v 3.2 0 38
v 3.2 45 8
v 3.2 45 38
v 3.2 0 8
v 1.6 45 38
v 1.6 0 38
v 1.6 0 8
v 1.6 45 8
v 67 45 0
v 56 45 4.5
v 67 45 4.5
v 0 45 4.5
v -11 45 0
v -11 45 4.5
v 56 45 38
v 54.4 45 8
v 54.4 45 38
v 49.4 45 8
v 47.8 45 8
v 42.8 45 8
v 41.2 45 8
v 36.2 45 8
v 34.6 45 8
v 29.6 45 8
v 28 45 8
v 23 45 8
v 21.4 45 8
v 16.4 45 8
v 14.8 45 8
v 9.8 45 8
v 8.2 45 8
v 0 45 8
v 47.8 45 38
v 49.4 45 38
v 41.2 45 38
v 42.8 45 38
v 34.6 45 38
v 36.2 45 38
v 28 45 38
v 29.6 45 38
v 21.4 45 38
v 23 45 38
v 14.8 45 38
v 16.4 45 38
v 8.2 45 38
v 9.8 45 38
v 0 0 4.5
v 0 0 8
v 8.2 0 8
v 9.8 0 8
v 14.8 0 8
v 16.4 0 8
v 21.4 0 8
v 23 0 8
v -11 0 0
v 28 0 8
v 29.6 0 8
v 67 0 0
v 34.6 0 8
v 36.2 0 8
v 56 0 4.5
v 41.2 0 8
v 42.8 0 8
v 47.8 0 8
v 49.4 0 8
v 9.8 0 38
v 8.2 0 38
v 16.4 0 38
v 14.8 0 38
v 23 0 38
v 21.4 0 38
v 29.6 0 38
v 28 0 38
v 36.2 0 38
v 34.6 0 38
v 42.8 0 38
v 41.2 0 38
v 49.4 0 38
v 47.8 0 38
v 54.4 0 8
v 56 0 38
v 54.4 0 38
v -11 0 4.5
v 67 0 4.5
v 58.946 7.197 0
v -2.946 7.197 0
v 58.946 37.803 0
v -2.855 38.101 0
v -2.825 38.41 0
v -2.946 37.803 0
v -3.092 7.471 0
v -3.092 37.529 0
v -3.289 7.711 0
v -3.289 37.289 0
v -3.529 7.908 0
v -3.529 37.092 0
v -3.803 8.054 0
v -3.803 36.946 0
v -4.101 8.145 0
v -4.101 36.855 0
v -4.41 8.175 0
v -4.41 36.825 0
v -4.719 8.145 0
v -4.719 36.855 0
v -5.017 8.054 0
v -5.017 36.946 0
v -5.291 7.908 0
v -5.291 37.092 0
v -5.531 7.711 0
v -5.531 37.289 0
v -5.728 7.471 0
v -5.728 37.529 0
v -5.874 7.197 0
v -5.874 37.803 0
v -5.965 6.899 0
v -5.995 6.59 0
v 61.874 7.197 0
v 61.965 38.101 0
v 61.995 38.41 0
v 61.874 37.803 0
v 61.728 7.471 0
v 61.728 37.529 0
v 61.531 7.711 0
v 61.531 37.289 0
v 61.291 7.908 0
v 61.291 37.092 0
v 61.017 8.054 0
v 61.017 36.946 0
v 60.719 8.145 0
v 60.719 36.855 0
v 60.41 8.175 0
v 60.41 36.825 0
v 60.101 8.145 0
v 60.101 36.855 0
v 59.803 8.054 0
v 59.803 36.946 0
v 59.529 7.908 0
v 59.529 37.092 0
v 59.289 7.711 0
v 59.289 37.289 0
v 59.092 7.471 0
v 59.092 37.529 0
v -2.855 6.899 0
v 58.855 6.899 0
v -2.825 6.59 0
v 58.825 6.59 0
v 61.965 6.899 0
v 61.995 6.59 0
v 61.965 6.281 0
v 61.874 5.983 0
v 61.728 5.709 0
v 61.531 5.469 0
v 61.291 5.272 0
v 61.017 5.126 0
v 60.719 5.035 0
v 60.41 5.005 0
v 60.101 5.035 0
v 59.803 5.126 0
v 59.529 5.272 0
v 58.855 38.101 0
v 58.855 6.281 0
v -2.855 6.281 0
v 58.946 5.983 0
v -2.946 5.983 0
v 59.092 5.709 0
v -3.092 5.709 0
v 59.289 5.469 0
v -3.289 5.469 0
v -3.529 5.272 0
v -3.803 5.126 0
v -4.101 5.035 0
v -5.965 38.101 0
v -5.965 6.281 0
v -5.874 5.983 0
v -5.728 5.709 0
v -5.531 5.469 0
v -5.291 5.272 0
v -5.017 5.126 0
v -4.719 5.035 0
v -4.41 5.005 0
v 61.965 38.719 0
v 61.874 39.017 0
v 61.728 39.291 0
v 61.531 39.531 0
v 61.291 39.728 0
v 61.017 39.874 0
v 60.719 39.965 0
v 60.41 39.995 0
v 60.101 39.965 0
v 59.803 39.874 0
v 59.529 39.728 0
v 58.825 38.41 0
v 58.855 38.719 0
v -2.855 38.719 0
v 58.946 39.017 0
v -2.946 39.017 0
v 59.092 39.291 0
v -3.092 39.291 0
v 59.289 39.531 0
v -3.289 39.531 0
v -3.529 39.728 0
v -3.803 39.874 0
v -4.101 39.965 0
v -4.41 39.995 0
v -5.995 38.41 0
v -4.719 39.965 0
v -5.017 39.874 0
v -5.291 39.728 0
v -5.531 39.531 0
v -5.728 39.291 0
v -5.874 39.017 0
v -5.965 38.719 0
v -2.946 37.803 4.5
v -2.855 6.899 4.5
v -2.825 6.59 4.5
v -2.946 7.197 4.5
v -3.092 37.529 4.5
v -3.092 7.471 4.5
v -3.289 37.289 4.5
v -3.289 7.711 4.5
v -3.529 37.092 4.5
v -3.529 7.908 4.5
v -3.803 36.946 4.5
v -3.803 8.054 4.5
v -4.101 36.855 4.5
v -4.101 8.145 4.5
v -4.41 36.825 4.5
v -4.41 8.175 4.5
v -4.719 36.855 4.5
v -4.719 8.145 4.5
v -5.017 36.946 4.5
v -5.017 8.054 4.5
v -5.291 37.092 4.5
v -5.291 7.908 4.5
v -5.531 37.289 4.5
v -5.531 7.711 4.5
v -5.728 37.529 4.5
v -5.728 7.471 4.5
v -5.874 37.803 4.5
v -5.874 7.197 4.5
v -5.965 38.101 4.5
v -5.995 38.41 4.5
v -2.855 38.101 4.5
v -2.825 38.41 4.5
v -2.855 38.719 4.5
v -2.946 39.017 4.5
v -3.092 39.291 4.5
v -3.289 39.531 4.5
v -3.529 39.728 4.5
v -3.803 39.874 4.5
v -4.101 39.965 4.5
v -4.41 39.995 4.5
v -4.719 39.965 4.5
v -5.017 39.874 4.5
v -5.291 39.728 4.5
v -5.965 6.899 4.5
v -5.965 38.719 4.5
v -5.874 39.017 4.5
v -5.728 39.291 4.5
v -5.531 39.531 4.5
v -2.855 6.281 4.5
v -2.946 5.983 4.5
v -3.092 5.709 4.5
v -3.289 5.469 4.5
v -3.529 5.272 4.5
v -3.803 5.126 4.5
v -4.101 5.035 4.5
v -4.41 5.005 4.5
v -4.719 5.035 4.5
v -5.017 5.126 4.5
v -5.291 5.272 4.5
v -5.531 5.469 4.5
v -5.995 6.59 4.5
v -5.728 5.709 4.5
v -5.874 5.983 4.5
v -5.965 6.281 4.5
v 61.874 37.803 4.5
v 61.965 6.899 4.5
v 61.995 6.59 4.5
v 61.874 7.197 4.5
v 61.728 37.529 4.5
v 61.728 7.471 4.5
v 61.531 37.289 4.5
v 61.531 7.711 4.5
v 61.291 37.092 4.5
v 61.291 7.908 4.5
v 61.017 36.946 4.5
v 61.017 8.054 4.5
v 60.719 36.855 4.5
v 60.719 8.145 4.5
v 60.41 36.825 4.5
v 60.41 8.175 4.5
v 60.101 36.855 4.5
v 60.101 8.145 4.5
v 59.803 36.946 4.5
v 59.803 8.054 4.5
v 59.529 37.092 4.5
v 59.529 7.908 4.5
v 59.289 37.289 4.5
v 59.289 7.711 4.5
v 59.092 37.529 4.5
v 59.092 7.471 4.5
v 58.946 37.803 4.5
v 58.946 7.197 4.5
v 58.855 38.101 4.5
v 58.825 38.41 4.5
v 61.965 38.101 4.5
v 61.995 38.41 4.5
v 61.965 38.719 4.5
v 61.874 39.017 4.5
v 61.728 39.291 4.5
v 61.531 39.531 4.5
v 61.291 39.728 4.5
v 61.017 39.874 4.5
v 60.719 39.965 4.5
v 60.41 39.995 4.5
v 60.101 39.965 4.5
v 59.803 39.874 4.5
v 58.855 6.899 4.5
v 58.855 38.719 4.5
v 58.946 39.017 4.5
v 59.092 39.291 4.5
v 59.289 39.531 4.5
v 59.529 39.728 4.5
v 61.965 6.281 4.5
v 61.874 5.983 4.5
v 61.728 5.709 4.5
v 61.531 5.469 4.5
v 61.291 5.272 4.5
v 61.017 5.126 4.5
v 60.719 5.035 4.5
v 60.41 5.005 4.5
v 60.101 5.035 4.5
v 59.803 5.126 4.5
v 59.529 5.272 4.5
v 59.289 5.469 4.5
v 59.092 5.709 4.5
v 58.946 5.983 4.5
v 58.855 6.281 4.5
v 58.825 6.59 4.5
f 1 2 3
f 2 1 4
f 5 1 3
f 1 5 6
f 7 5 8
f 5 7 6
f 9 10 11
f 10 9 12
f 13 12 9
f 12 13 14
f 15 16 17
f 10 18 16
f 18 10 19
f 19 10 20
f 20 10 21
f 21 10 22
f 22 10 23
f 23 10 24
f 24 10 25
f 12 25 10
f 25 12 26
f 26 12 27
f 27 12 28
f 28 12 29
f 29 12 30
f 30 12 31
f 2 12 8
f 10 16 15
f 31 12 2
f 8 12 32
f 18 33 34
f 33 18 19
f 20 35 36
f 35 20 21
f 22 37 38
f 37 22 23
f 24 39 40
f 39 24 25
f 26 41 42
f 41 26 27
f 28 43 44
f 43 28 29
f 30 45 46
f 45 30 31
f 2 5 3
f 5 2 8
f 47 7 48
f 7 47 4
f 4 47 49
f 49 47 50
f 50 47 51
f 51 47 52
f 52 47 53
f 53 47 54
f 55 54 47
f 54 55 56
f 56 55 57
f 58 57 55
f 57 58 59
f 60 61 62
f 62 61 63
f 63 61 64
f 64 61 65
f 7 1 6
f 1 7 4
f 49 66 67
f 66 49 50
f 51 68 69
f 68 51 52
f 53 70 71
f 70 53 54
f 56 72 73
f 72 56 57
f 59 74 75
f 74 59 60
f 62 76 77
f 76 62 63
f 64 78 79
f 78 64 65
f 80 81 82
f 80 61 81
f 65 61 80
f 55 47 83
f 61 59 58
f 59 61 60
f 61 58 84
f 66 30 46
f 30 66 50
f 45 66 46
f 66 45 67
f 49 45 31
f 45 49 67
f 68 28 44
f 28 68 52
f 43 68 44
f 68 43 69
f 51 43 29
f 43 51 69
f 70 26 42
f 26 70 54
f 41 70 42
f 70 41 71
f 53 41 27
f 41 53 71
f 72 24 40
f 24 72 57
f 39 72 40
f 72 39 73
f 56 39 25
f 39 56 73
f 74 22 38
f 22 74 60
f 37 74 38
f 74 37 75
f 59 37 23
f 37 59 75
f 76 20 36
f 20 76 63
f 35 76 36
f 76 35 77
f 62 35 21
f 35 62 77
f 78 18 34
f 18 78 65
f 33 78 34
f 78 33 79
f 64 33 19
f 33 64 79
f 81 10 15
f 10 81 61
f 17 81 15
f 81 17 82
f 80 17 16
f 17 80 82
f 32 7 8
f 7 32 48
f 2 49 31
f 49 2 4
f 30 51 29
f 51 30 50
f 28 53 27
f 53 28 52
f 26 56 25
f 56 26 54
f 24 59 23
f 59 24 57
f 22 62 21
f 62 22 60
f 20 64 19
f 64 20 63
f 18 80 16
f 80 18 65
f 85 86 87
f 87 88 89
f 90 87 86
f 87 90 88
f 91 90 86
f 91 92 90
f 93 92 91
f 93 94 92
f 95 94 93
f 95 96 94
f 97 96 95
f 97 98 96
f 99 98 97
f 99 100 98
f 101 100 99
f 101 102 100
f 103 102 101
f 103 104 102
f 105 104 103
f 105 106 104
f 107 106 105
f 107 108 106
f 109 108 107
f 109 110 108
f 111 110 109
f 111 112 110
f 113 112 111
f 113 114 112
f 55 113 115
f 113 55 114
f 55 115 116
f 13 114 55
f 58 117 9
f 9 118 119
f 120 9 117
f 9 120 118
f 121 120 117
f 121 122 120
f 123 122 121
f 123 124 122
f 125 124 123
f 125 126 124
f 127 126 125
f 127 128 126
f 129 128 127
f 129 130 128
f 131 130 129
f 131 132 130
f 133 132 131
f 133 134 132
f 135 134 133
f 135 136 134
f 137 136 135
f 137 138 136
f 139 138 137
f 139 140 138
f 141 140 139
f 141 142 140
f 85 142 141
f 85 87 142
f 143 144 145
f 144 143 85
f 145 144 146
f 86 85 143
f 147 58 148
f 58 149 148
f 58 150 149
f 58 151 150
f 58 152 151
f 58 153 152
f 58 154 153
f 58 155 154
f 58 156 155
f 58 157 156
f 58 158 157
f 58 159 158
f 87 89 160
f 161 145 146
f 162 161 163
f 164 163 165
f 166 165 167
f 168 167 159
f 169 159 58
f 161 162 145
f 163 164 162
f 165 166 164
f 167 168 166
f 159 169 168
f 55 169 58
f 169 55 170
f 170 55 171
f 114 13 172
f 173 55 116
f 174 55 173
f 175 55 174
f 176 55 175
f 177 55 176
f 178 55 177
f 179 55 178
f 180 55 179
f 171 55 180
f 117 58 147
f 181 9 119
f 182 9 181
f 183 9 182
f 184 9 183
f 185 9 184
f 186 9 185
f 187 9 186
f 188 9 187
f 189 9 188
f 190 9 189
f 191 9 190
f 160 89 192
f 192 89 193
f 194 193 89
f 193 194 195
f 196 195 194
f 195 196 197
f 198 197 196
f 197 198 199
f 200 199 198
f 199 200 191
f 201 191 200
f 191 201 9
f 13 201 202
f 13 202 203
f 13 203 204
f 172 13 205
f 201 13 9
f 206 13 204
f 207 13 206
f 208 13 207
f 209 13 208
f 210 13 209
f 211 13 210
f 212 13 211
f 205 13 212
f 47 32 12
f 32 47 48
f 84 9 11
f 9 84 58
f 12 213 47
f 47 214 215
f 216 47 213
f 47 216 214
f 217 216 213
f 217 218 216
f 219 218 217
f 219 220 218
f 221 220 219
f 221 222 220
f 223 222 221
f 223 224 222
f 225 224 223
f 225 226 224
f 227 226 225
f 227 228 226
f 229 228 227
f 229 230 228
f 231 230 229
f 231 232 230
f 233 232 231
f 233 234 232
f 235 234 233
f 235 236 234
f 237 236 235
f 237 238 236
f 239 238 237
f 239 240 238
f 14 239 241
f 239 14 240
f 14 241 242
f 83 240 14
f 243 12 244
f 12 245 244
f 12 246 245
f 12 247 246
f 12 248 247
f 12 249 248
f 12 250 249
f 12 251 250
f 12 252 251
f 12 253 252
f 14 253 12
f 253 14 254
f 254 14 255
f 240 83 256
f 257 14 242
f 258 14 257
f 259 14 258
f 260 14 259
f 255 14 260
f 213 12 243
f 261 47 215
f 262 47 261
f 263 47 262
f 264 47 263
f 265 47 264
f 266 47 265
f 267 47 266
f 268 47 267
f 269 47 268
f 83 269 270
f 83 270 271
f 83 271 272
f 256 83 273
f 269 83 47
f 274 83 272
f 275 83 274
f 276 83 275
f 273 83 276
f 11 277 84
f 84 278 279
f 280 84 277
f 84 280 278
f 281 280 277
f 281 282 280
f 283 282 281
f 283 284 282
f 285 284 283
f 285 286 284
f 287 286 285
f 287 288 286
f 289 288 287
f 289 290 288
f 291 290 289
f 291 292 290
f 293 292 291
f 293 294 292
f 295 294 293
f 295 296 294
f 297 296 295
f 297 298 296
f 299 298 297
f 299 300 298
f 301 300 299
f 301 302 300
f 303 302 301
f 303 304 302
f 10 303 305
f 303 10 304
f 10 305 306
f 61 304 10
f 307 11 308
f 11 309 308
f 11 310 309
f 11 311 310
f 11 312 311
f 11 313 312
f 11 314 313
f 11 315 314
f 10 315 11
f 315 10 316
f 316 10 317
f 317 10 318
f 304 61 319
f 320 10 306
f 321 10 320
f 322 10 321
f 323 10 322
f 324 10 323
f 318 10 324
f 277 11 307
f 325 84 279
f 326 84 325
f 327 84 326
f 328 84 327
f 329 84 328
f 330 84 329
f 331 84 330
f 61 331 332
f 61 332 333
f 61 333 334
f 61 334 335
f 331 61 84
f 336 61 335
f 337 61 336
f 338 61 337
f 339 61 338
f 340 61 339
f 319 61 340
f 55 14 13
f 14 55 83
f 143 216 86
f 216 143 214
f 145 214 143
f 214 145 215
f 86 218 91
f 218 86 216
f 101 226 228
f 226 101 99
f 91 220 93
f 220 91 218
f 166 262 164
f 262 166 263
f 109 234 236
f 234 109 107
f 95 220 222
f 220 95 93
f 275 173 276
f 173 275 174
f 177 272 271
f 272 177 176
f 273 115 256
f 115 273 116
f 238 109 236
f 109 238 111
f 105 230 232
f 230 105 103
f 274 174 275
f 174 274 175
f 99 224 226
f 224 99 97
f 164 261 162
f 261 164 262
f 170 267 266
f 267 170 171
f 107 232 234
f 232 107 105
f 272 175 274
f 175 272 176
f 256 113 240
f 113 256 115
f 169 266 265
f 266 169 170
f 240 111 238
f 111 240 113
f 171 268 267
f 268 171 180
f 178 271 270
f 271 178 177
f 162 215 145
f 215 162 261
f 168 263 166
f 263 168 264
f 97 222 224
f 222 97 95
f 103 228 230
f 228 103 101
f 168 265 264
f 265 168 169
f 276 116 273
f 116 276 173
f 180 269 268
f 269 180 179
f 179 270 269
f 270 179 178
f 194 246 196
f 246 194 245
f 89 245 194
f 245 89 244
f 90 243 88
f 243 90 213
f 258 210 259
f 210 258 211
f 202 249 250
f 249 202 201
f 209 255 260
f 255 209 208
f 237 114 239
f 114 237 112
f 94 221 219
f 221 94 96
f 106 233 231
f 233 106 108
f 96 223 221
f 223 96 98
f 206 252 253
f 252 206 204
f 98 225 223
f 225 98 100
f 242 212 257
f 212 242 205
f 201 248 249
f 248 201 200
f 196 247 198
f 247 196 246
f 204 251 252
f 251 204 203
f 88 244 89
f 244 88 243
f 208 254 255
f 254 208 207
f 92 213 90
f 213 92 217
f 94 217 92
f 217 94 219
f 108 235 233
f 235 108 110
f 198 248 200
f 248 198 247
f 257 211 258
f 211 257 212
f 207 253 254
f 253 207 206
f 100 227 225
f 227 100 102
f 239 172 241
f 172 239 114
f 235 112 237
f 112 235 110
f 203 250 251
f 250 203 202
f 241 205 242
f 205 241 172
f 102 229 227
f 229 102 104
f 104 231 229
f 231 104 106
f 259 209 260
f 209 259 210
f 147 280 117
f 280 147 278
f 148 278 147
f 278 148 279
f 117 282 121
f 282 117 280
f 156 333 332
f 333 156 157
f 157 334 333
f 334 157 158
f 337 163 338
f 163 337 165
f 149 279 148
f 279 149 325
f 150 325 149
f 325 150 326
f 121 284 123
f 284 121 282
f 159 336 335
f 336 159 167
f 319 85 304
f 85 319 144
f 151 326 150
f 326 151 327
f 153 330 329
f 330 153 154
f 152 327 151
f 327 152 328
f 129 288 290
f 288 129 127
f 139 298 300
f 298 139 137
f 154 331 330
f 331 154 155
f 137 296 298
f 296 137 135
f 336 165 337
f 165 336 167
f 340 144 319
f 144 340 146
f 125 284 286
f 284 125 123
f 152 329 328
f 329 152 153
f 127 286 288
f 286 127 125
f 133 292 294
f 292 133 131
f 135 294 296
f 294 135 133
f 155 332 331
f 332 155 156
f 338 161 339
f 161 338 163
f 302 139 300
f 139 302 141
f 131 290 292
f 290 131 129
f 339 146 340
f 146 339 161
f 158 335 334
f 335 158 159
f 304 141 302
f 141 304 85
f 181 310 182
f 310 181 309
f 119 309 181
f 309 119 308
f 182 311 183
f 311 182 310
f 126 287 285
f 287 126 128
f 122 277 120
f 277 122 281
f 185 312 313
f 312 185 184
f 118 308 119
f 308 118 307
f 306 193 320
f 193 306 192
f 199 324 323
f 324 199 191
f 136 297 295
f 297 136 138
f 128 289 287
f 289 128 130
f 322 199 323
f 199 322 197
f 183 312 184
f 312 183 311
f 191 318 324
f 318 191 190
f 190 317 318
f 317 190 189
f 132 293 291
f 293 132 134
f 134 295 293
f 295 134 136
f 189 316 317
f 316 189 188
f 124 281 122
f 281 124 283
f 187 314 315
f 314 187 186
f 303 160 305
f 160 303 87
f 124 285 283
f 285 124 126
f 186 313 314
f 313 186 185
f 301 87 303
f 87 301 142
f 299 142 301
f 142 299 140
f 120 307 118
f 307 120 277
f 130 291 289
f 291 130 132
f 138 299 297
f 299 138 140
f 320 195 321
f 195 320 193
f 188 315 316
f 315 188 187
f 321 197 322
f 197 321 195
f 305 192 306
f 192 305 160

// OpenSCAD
$fn = 32;

// ----------------------------------------------------------------------
// Finned heat sink: 56 x 45 mm base, 30 mm fins
// ----------------------------------------------------------------------

// --- parameters (mm) ---
base_w = 56;              // base width
base_d = 45;              // base depth
base_t = 8;               // base thickness
fin_h = 30;               // fin height above the base
holes_d = 3.17;           // fixing holes
hole_x = 32.41;           // hole offset in x
hole_y = 15.91;           // hole offset in y
fin_t = 1.6;              // fin thickness
fin_pitch = 6.6;          // fin pitch
fin_count = 9;            // number of fins
fin_x0 = 1.6;             // first fin offset
flange_w = 78;            // flange plate width
flange_t = 4;             // flange plate thickness

difference() {
  union() {
    cube([base_w, base_d, base_t]);
    for (i = [0 : fin_count - 1]) {
      translate([fin_x0 + i * fin_pitch, 0, base_t - 0.5]) cube([fin_t, base_d, fin_h + 0.5]);
    }
    /* mounting flange, a wider plate sharing the base bottom */
    translate([(base_w - flange_w) / 2, 0, 0]) cube([flange_w, base_d, flange_t + 0.5]);
  }
  /* fixing holes through the base, 2.5 mm clear on both sides */
  for (hx = [-32.41, 32.41]) {
    for (hy = [-15.91, 15.91]) {
      translate([base_w / 2 + hx, base_d / 2 + hy, -2.5]) cylinder(h = base_t + 5, d = holes_d);
    }
  }
}
